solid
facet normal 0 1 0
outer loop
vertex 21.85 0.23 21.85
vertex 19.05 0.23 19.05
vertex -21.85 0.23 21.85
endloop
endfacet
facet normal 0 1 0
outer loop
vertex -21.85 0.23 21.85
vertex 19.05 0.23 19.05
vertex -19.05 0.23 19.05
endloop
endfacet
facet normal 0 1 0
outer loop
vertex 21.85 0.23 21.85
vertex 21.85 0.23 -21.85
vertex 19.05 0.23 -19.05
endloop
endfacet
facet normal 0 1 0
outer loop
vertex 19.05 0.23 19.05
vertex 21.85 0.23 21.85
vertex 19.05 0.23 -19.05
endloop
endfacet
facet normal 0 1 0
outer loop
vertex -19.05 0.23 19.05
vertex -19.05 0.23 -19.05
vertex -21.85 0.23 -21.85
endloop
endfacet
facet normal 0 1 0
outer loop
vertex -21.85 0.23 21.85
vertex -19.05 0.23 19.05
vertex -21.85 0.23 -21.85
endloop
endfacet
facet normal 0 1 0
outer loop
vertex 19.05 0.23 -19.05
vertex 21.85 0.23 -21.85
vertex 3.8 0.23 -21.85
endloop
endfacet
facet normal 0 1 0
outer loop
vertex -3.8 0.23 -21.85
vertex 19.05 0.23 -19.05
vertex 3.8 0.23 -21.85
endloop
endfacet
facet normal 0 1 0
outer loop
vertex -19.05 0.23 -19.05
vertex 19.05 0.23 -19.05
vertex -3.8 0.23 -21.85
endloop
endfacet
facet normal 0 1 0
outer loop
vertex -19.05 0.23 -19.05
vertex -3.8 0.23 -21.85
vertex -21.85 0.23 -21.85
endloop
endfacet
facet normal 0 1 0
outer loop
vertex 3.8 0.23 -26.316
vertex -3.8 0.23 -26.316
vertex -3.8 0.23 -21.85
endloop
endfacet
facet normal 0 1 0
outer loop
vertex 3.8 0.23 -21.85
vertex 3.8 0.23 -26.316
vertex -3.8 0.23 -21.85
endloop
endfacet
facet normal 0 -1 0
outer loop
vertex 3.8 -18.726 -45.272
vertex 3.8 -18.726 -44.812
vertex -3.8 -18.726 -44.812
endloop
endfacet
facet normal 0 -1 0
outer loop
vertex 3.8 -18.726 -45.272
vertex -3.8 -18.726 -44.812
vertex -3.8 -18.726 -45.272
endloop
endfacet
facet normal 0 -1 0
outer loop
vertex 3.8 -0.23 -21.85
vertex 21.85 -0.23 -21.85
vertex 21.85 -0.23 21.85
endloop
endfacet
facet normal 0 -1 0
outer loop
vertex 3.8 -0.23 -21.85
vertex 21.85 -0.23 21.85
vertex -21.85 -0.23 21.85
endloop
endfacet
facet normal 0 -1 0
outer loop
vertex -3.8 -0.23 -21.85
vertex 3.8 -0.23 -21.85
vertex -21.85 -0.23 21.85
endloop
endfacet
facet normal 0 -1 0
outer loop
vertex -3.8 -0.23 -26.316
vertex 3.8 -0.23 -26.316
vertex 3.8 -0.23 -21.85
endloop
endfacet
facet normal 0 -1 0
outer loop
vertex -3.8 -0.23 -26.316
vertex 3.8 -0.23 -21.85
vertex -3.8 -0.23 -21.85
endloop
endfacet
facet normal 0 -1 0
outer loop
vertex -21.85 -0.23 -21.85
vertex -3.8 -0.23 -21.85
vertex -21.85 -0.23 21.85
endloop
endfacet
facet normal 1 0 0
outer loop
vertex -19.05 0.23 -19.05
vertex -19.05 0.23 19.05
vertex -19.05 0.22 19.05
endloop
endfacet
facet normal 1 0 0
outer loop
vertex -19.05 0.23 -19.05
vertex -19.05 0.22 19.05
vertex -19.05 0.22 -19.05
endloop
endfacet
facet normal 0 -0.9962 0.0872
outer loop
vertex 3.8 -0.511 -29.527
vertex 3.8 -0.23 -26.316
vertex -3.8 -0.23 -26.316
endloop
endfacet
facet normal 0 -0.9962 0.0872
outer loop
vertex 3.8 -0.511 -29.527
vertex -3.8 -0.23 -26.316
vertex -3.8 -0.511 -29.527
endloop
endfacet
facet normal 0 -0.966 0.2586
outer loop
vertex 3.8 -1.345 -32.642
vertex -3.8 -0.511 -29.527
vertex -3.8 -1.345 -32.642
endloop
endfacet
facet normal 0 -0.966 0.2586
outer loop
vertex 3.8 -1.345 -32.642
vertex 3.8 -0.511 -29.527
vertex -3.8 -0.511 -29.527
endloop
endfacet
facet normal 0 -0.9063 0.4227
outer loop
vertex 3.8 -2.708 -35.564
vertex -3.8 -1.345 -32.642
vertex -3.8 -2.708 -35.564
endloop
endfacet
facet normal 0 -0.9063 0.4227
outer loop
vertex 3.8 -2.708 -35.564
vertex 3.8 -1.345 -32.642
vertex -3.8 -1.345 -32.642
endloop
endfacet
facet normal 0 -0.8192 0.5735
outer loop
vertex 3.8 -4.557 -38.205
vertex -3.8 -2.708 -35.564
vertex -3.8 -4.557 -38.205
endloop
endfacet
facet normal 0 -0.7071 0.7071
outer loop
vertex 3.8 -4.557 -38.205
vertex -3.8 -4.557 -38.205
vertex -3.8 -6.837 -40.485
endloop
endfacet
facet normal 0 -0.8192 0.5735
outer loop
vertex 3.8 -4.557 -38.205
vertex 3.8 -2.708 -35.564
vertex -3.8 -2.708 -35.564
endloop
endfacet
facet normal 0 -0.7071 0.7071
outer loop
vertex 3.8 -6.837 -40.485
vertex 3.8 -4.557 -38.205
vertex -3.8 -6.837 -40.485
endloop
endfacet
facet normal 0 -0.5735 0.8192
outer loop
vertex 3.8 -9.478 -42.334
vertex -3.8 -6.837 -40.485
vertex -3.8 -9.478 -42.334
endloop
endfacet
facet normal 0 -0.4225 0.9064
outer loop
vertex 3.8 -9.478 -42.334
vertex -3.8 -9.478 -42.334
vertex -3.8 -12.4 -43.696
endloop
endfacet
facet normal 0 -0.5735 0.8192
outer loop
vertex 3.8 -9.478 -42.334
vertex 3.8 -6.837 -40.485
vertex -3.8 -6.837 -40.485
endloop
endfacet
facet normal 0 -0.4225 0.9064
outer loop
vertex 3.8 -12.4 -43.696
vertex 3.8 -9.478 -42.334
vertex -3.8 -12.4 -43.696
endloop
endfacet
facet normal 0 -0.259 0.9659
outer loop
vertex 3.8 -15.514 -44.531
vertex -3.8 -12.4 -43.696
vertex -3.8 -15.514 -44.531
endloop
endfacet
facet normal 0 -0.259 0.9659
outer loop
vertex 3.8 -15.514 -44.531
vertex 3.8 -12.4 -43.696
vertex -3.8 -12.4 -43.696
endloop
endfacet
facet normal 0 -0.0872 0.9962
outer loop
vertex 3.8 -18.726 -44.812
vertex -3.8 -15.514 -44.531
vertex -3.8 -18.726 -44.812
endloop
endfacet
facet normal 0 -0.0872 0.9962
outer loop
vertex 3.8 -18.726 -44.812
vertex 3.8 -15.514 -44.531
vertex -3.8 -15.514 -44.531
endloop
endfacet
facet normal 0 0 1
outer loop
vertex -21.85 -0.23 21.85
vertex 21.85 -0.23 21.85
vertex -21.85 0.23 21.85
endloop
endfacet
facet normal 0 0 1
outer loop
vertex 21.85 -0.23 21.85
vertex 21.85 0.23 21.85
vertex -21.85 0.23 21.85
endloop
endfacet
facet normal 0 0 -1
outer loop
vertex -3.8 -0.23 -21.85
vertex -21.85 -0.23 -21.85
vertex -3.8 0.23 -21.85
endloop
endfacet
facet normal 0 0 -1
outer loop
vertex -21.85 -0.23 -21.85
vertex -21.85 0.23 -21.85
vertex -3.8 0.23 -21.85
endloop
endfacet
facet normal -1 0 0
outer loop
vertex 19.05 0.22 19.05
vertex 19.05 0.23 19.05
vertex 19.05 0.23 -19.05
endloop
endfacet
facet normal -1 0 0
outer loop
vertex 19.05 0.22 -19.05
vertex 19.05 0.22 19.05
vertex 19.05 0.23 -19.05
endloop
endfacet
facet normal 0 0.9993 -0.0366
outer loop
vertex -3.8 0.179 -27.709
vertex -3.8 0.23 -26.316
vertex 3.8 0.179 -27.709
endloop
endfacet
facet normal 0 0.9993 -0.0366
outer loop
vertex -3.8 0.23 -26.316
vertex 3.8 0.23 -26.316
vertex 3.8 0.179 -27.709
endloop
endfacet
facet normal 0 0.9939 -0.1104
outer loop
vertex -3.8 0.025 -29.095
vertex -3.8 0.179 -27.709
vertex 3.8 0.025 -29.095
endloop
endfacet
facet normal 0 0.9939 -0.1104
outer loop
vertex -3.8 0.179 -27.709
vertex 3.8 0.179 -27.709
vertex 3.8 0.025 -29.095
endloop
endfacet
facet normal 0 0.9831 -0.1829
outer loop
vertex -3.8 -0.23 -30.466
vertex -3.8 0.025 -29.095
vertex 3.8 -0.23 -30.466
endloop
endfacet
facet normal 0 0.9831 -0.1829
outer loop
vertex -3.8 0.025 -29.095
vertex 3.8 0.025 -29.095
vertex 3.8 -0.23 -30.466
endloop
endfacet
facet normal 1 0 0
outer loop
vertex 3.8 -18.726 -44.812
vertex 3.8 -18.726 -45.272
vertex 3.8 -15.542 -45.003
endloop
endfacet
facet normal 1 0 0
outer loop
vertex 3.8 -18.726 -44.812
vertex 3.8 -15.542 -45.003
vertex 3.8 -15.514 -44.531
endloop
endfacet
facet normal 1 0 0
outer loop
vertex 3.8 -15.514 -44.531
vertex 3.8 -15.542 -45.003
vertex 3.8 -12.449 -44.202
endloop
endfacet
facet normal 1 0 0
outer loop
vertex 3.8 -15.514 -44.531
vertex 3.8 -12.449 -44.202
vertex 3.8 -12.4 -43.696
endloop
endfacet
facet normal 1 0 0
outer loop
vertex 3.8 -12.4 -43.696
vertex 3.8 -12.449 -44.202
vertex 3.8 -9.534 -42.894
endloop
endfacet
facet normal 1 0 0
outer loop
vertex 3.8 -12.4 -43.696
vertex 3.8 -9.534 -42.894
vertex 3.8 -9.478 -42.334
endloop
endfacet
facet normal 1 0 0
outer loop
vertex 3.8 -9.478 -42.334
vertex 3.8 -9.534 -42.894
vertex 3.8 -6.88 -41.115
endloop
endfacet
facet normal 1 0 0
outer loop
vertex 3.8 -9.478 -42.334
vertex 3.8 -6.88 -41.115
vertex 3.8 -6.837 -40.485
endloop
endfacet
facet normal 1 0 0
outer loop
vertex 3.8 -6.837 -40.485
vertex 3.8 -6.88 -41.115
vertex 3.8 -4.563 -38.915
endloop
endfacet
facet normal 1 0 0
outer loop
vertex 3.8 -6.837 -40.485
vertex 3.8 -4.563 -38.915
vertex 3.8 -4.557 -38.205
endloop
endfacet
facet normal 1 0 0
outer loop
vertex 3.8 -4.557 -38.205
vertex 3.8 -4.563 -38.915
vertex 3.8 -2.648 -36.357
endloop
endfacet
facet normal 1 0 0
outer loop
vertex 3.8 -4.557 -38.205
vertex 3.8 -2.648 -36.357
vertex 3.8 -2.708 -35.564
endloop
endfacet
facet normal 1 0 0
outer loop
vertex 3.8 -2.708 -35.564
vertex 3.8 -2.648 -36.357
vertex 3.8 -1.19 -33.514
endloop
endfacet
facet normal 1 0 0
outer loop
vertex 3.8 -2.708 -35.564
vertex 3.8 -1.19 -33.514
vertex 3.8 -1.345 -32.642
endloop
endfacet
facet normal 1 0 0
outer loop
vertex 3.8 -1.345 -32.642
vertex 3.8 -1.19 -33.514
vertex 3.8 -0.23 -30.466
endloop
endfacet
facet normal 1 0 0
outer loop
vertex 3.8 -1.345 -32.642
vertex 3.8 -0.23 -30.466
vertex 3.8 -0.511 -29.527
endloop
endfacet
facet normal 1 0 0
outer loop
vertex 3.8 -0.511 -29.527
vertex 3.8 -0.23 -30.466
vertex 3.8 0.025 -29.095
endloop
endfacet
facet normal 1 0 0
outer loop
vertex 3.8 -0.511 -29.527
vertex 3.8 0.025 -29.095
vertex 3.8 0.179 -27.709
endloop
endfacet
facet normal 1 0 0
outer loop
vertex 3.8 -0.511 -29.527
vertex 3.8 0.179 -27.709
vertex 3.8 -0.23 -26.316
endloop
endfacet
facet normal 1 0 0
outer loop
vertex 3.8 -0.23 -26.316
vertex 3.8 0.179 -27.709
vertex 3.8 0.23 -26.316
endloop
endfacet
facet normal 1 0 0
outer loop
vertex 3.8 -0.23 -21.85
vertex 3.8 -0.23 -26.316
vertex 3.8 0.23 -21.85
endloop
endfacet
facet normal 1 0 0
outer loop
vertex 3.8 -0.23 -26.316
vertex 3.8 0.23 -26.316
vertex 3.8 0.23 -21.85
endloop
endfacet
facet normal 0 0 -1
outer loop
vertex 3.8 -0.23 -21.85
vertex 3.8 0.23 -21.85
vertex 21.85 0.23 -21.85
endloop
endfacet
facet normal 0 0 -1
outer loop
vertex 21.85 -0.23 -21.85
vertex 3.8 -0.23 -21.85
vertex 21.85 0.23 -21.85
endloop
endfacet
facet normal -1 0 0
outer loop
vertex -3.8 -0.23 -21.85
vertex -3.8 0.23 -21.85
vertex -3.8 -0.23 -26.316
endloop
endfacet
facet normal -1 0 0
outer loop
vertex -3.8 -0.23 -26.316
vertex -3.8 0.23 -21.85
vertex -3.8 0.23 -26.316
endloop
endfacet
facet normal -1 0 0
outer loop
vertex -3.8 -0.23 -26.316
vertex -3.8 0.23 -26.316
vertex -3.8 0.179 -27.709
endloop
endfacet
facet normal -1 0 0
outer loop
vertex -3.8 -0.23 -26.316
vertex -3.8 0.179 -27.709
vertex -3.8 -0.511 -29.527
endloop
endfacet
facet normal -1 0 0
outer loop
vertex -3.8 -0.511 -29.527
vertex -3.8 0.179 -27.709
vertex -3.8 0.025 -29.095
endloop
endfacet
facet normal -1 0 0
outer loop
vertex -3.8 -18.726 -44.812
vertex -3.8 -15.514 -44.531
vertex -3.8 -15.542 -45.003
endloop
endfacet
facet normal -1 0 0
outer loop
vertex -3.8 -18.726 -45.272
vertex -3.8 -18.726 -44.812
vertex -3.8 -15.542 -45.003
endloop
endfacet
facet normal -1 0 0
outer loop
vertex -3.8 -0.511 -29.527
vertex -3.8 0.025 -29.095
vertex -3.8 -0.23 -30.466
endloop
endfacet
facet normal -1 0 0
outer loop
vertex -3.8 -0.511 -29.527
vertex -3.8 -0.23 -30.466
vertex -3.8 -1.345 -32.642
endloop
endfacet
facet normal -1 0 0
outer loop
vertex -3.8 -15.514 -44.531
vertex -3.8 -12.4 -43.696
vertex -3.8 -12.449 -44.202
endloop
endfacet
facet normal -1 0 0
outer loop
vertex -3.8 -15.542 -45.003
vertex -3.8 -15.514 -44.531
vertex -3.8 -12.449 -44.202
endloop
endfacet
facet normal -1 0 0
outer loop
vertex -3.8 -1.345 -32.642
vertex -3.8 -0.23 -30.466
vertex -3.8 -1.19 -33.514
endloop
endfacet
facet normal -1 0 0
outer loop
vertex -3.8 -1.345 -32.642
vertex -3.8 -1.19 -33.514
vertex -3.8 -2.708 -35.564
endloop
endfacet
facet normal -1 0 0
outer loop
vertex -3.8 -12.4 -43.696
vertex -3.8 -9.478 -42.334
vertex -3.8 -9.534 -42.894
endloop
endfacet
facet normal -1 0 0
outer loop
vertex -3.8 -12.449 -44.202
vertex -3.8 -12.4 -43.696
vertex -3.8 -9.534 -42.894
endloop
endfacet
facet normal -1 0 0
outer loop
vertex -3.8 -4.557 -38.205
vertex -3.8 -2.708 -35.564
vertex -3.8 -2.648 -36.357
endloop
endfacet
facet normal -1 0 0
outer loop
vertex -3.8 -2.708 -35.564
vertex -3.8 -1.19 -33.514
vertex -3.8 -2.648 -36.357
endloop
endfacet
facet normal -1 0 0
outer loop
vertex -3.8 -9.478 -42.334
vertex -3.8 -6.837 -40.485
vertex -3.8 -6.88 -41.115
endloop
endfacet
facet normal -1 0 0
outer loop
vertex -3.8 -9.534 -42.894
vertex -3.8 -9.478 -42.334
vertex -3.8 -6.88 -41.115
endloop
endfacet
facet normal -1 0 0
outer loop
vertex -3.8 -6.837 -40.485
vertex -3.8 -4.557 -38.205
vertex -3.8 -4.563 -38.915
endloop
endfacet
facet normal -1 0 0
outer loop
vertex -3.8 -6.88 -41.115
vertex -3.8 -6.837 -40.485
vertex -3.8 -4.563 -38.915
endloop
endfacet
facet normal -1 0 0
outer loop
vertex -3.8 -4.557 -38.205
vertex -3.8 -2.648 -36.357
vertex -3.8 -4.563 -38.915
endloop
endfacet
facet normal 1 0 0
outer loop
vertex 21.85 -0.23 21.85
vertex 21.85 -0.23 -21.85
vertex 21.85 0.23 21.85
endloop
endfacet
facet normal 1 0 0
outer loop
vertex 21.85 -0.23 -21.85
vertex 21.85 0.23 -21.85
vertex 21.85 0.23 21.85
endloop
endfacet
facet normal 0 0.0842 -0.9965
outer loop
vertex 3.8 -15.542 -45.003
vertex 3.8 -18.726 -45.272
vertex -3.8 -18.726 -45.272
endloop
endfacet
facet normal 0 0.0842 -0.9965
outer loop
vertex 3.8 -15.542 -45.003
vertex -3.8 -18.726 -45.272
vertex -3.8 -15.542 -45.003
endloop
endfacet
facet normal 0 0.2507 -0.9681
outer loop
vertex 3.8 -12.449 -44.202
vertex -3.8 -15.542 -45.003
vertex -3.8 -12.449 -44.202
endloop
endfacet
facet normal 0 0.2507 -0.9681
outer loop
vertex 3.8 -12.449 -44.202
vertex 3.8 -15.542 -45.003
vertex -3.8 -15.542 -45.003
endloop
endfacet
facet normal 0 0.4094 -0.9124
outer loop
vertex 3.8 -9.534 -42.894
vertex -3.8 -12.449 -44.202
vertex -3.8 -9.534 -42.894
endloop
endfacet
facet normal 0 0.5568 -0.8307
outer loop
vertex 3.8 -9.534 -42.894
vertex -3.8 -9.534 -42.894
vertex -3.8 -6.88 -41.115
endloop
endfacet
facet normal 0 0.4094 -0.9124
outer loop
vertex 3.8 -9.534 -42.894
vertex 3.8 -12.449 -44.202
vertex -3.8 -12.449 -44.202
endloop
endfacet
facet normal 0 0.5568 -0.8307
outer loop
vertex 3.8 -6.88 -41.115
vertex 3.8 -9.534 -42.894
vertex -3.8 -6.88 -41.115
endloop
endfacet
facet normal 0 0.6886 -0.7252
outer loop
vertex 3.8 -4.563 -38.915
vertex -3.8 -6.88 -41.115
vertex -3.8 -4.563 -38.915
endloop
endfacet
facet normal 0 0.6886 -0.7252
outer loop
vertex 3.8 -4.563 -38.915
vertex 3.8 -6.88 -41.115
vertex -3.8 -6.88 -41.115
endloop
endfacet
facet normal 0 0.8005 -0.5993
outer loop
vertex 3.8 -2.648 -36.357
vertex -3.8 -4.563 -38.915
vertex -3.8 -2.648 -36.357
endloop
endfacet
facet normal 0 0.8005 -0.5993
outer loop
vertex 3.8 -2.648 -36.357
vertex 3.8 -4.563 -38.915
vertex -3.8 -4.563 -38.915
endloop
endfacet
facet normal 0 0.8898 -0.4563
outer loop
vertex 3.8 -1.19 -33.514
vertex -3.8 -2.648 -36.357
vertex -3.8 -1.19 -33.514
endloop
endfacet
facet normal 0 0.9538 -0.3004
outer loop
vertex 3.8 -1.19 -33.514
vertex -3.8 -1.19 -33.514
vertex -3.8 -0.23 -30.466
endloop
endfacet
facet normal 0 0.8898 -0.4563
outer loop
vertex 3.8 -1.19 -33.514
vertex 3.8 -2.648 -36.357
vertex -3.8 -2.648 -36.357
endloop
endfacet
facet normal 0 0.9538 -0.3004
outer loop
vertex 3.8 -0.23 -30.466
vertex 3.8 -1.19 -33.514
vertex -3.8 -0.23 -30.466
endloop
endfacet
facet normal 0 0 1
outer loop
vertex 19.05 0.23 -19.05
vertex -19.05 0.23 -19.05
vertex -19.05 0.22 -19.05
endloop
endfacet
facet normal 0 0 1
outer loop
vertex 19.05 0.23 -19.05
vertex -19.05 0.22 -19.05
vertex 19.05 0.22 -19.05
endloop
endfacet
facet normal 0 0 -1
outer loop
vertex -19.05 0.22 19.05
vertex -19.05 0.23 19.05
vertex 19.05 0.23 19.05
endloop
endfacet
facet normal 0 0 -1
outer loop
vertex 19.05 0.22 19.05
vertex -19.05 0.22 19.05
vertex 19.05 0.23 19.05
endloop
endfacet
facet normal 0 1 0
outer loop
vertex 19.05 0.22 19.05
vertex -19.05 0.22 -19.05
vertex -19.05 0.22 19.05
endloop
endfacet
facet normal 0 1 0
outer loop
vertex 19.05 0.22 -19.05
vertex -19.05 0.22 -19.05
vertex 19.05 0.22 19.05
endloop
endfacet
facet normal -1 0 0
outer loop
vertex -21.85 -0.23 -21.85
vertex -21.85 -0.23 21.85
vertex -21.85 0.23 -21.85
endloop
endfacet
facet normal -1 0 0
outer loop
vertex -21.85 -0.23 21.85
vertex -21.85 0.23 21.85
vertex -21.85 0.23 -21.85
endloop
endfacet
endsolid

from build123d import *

# Parameters (mm, degrees)
BOSS_EXTRUDE1_DEPTH = 0.23
SKETCH2_W           = 38.1
SKETCH2_H           = 38.1
CUT_EXTRUDE1_DEPTH  = 0.01
BOSS_EXTRUDE2_DEPTH = 3.8
CUT_EXTRUDE2_DEPTH  = 3.8


with BuildPart() as part:
    # Sketch1 → Boss-Extrude1 (new body, symmetric)
    with BuildSketch(Plane(origin=(0, 0, 0), x_dir=(1, 0, 0), z_dir=(0, 1, 0))):
        Polygon((3.8, 21.85), (21.85, 21.85), (21.85, -21.85), (-21.85, -21.85), (-21.85, 21.85), (-3.8, 21.85), (-3.8, 61.95), (3.8, 61.95), align=None)
    extrude(amount=BOSS_EXTRUDE1_DEPTH, both=True)

    # Sketch2 → Cut-Extrude1 (cut)
    with BuildSketch(Plane(origin=(0, 0.23, 0), x_dir=(1, 0, 0), z_dir=(0, 1, 0))):
        Rectangle(SKETCH2_W, SKETCH2_H)
    extrude(amount=-CUT_EXTRUDE1_DEPTH, mode=Mode.SUBTRACT)

    # Sketch3 → Boss-Extrude2 (add, symmetric)
    with BuildSketch(Plane(origin=(0, 0, 0), x_dir=(0, 0, -1), z_dir=(1, 0, 0))):
        with BuildLine():
            Line((26.315584349, 0.23), (26.315584349, -0.23))
            ThreePointArc((26.315584349, -0.23), (39.394431992, -5.647436074), (44.811868066, -18.726283717))
            Line((44.811868066, -18.726283717), (45.271868066, -18.726283717))
            ThreePointArc((45.271868066, -18.726283717), (39.719701111, -5.322166955), (26.315584349, 0.23))
        make_face()
    extrude(amount=BOSS_EXTRUDE2_DEPTH, both=True)

    # Sketch4 → Cut-Extrude2 (cut, symmetric)
    with BuildSketch(Plane(origin=(0, 0, 0), x_dir=(0, 0, -1), z_dir=(1, 0, 0))):
        with BuildLine():
            Line((30.466268753, -0.23), (61.95, -0.23))
            Line((61.95, -0.23), (61.95, 0.23))
            Line((61.95, 0.23), (26.315584349, 0.23))
            ThreePointArc((26.315584349, 0.23), (28.403632542, 0.114649039), (30.466268753, -0.23))
        make_face()
    extrude(amount=CUT_EXTRUDE2_DEPTH, both=True, mode=Mode.SUBTRACT)


solid = part.part
